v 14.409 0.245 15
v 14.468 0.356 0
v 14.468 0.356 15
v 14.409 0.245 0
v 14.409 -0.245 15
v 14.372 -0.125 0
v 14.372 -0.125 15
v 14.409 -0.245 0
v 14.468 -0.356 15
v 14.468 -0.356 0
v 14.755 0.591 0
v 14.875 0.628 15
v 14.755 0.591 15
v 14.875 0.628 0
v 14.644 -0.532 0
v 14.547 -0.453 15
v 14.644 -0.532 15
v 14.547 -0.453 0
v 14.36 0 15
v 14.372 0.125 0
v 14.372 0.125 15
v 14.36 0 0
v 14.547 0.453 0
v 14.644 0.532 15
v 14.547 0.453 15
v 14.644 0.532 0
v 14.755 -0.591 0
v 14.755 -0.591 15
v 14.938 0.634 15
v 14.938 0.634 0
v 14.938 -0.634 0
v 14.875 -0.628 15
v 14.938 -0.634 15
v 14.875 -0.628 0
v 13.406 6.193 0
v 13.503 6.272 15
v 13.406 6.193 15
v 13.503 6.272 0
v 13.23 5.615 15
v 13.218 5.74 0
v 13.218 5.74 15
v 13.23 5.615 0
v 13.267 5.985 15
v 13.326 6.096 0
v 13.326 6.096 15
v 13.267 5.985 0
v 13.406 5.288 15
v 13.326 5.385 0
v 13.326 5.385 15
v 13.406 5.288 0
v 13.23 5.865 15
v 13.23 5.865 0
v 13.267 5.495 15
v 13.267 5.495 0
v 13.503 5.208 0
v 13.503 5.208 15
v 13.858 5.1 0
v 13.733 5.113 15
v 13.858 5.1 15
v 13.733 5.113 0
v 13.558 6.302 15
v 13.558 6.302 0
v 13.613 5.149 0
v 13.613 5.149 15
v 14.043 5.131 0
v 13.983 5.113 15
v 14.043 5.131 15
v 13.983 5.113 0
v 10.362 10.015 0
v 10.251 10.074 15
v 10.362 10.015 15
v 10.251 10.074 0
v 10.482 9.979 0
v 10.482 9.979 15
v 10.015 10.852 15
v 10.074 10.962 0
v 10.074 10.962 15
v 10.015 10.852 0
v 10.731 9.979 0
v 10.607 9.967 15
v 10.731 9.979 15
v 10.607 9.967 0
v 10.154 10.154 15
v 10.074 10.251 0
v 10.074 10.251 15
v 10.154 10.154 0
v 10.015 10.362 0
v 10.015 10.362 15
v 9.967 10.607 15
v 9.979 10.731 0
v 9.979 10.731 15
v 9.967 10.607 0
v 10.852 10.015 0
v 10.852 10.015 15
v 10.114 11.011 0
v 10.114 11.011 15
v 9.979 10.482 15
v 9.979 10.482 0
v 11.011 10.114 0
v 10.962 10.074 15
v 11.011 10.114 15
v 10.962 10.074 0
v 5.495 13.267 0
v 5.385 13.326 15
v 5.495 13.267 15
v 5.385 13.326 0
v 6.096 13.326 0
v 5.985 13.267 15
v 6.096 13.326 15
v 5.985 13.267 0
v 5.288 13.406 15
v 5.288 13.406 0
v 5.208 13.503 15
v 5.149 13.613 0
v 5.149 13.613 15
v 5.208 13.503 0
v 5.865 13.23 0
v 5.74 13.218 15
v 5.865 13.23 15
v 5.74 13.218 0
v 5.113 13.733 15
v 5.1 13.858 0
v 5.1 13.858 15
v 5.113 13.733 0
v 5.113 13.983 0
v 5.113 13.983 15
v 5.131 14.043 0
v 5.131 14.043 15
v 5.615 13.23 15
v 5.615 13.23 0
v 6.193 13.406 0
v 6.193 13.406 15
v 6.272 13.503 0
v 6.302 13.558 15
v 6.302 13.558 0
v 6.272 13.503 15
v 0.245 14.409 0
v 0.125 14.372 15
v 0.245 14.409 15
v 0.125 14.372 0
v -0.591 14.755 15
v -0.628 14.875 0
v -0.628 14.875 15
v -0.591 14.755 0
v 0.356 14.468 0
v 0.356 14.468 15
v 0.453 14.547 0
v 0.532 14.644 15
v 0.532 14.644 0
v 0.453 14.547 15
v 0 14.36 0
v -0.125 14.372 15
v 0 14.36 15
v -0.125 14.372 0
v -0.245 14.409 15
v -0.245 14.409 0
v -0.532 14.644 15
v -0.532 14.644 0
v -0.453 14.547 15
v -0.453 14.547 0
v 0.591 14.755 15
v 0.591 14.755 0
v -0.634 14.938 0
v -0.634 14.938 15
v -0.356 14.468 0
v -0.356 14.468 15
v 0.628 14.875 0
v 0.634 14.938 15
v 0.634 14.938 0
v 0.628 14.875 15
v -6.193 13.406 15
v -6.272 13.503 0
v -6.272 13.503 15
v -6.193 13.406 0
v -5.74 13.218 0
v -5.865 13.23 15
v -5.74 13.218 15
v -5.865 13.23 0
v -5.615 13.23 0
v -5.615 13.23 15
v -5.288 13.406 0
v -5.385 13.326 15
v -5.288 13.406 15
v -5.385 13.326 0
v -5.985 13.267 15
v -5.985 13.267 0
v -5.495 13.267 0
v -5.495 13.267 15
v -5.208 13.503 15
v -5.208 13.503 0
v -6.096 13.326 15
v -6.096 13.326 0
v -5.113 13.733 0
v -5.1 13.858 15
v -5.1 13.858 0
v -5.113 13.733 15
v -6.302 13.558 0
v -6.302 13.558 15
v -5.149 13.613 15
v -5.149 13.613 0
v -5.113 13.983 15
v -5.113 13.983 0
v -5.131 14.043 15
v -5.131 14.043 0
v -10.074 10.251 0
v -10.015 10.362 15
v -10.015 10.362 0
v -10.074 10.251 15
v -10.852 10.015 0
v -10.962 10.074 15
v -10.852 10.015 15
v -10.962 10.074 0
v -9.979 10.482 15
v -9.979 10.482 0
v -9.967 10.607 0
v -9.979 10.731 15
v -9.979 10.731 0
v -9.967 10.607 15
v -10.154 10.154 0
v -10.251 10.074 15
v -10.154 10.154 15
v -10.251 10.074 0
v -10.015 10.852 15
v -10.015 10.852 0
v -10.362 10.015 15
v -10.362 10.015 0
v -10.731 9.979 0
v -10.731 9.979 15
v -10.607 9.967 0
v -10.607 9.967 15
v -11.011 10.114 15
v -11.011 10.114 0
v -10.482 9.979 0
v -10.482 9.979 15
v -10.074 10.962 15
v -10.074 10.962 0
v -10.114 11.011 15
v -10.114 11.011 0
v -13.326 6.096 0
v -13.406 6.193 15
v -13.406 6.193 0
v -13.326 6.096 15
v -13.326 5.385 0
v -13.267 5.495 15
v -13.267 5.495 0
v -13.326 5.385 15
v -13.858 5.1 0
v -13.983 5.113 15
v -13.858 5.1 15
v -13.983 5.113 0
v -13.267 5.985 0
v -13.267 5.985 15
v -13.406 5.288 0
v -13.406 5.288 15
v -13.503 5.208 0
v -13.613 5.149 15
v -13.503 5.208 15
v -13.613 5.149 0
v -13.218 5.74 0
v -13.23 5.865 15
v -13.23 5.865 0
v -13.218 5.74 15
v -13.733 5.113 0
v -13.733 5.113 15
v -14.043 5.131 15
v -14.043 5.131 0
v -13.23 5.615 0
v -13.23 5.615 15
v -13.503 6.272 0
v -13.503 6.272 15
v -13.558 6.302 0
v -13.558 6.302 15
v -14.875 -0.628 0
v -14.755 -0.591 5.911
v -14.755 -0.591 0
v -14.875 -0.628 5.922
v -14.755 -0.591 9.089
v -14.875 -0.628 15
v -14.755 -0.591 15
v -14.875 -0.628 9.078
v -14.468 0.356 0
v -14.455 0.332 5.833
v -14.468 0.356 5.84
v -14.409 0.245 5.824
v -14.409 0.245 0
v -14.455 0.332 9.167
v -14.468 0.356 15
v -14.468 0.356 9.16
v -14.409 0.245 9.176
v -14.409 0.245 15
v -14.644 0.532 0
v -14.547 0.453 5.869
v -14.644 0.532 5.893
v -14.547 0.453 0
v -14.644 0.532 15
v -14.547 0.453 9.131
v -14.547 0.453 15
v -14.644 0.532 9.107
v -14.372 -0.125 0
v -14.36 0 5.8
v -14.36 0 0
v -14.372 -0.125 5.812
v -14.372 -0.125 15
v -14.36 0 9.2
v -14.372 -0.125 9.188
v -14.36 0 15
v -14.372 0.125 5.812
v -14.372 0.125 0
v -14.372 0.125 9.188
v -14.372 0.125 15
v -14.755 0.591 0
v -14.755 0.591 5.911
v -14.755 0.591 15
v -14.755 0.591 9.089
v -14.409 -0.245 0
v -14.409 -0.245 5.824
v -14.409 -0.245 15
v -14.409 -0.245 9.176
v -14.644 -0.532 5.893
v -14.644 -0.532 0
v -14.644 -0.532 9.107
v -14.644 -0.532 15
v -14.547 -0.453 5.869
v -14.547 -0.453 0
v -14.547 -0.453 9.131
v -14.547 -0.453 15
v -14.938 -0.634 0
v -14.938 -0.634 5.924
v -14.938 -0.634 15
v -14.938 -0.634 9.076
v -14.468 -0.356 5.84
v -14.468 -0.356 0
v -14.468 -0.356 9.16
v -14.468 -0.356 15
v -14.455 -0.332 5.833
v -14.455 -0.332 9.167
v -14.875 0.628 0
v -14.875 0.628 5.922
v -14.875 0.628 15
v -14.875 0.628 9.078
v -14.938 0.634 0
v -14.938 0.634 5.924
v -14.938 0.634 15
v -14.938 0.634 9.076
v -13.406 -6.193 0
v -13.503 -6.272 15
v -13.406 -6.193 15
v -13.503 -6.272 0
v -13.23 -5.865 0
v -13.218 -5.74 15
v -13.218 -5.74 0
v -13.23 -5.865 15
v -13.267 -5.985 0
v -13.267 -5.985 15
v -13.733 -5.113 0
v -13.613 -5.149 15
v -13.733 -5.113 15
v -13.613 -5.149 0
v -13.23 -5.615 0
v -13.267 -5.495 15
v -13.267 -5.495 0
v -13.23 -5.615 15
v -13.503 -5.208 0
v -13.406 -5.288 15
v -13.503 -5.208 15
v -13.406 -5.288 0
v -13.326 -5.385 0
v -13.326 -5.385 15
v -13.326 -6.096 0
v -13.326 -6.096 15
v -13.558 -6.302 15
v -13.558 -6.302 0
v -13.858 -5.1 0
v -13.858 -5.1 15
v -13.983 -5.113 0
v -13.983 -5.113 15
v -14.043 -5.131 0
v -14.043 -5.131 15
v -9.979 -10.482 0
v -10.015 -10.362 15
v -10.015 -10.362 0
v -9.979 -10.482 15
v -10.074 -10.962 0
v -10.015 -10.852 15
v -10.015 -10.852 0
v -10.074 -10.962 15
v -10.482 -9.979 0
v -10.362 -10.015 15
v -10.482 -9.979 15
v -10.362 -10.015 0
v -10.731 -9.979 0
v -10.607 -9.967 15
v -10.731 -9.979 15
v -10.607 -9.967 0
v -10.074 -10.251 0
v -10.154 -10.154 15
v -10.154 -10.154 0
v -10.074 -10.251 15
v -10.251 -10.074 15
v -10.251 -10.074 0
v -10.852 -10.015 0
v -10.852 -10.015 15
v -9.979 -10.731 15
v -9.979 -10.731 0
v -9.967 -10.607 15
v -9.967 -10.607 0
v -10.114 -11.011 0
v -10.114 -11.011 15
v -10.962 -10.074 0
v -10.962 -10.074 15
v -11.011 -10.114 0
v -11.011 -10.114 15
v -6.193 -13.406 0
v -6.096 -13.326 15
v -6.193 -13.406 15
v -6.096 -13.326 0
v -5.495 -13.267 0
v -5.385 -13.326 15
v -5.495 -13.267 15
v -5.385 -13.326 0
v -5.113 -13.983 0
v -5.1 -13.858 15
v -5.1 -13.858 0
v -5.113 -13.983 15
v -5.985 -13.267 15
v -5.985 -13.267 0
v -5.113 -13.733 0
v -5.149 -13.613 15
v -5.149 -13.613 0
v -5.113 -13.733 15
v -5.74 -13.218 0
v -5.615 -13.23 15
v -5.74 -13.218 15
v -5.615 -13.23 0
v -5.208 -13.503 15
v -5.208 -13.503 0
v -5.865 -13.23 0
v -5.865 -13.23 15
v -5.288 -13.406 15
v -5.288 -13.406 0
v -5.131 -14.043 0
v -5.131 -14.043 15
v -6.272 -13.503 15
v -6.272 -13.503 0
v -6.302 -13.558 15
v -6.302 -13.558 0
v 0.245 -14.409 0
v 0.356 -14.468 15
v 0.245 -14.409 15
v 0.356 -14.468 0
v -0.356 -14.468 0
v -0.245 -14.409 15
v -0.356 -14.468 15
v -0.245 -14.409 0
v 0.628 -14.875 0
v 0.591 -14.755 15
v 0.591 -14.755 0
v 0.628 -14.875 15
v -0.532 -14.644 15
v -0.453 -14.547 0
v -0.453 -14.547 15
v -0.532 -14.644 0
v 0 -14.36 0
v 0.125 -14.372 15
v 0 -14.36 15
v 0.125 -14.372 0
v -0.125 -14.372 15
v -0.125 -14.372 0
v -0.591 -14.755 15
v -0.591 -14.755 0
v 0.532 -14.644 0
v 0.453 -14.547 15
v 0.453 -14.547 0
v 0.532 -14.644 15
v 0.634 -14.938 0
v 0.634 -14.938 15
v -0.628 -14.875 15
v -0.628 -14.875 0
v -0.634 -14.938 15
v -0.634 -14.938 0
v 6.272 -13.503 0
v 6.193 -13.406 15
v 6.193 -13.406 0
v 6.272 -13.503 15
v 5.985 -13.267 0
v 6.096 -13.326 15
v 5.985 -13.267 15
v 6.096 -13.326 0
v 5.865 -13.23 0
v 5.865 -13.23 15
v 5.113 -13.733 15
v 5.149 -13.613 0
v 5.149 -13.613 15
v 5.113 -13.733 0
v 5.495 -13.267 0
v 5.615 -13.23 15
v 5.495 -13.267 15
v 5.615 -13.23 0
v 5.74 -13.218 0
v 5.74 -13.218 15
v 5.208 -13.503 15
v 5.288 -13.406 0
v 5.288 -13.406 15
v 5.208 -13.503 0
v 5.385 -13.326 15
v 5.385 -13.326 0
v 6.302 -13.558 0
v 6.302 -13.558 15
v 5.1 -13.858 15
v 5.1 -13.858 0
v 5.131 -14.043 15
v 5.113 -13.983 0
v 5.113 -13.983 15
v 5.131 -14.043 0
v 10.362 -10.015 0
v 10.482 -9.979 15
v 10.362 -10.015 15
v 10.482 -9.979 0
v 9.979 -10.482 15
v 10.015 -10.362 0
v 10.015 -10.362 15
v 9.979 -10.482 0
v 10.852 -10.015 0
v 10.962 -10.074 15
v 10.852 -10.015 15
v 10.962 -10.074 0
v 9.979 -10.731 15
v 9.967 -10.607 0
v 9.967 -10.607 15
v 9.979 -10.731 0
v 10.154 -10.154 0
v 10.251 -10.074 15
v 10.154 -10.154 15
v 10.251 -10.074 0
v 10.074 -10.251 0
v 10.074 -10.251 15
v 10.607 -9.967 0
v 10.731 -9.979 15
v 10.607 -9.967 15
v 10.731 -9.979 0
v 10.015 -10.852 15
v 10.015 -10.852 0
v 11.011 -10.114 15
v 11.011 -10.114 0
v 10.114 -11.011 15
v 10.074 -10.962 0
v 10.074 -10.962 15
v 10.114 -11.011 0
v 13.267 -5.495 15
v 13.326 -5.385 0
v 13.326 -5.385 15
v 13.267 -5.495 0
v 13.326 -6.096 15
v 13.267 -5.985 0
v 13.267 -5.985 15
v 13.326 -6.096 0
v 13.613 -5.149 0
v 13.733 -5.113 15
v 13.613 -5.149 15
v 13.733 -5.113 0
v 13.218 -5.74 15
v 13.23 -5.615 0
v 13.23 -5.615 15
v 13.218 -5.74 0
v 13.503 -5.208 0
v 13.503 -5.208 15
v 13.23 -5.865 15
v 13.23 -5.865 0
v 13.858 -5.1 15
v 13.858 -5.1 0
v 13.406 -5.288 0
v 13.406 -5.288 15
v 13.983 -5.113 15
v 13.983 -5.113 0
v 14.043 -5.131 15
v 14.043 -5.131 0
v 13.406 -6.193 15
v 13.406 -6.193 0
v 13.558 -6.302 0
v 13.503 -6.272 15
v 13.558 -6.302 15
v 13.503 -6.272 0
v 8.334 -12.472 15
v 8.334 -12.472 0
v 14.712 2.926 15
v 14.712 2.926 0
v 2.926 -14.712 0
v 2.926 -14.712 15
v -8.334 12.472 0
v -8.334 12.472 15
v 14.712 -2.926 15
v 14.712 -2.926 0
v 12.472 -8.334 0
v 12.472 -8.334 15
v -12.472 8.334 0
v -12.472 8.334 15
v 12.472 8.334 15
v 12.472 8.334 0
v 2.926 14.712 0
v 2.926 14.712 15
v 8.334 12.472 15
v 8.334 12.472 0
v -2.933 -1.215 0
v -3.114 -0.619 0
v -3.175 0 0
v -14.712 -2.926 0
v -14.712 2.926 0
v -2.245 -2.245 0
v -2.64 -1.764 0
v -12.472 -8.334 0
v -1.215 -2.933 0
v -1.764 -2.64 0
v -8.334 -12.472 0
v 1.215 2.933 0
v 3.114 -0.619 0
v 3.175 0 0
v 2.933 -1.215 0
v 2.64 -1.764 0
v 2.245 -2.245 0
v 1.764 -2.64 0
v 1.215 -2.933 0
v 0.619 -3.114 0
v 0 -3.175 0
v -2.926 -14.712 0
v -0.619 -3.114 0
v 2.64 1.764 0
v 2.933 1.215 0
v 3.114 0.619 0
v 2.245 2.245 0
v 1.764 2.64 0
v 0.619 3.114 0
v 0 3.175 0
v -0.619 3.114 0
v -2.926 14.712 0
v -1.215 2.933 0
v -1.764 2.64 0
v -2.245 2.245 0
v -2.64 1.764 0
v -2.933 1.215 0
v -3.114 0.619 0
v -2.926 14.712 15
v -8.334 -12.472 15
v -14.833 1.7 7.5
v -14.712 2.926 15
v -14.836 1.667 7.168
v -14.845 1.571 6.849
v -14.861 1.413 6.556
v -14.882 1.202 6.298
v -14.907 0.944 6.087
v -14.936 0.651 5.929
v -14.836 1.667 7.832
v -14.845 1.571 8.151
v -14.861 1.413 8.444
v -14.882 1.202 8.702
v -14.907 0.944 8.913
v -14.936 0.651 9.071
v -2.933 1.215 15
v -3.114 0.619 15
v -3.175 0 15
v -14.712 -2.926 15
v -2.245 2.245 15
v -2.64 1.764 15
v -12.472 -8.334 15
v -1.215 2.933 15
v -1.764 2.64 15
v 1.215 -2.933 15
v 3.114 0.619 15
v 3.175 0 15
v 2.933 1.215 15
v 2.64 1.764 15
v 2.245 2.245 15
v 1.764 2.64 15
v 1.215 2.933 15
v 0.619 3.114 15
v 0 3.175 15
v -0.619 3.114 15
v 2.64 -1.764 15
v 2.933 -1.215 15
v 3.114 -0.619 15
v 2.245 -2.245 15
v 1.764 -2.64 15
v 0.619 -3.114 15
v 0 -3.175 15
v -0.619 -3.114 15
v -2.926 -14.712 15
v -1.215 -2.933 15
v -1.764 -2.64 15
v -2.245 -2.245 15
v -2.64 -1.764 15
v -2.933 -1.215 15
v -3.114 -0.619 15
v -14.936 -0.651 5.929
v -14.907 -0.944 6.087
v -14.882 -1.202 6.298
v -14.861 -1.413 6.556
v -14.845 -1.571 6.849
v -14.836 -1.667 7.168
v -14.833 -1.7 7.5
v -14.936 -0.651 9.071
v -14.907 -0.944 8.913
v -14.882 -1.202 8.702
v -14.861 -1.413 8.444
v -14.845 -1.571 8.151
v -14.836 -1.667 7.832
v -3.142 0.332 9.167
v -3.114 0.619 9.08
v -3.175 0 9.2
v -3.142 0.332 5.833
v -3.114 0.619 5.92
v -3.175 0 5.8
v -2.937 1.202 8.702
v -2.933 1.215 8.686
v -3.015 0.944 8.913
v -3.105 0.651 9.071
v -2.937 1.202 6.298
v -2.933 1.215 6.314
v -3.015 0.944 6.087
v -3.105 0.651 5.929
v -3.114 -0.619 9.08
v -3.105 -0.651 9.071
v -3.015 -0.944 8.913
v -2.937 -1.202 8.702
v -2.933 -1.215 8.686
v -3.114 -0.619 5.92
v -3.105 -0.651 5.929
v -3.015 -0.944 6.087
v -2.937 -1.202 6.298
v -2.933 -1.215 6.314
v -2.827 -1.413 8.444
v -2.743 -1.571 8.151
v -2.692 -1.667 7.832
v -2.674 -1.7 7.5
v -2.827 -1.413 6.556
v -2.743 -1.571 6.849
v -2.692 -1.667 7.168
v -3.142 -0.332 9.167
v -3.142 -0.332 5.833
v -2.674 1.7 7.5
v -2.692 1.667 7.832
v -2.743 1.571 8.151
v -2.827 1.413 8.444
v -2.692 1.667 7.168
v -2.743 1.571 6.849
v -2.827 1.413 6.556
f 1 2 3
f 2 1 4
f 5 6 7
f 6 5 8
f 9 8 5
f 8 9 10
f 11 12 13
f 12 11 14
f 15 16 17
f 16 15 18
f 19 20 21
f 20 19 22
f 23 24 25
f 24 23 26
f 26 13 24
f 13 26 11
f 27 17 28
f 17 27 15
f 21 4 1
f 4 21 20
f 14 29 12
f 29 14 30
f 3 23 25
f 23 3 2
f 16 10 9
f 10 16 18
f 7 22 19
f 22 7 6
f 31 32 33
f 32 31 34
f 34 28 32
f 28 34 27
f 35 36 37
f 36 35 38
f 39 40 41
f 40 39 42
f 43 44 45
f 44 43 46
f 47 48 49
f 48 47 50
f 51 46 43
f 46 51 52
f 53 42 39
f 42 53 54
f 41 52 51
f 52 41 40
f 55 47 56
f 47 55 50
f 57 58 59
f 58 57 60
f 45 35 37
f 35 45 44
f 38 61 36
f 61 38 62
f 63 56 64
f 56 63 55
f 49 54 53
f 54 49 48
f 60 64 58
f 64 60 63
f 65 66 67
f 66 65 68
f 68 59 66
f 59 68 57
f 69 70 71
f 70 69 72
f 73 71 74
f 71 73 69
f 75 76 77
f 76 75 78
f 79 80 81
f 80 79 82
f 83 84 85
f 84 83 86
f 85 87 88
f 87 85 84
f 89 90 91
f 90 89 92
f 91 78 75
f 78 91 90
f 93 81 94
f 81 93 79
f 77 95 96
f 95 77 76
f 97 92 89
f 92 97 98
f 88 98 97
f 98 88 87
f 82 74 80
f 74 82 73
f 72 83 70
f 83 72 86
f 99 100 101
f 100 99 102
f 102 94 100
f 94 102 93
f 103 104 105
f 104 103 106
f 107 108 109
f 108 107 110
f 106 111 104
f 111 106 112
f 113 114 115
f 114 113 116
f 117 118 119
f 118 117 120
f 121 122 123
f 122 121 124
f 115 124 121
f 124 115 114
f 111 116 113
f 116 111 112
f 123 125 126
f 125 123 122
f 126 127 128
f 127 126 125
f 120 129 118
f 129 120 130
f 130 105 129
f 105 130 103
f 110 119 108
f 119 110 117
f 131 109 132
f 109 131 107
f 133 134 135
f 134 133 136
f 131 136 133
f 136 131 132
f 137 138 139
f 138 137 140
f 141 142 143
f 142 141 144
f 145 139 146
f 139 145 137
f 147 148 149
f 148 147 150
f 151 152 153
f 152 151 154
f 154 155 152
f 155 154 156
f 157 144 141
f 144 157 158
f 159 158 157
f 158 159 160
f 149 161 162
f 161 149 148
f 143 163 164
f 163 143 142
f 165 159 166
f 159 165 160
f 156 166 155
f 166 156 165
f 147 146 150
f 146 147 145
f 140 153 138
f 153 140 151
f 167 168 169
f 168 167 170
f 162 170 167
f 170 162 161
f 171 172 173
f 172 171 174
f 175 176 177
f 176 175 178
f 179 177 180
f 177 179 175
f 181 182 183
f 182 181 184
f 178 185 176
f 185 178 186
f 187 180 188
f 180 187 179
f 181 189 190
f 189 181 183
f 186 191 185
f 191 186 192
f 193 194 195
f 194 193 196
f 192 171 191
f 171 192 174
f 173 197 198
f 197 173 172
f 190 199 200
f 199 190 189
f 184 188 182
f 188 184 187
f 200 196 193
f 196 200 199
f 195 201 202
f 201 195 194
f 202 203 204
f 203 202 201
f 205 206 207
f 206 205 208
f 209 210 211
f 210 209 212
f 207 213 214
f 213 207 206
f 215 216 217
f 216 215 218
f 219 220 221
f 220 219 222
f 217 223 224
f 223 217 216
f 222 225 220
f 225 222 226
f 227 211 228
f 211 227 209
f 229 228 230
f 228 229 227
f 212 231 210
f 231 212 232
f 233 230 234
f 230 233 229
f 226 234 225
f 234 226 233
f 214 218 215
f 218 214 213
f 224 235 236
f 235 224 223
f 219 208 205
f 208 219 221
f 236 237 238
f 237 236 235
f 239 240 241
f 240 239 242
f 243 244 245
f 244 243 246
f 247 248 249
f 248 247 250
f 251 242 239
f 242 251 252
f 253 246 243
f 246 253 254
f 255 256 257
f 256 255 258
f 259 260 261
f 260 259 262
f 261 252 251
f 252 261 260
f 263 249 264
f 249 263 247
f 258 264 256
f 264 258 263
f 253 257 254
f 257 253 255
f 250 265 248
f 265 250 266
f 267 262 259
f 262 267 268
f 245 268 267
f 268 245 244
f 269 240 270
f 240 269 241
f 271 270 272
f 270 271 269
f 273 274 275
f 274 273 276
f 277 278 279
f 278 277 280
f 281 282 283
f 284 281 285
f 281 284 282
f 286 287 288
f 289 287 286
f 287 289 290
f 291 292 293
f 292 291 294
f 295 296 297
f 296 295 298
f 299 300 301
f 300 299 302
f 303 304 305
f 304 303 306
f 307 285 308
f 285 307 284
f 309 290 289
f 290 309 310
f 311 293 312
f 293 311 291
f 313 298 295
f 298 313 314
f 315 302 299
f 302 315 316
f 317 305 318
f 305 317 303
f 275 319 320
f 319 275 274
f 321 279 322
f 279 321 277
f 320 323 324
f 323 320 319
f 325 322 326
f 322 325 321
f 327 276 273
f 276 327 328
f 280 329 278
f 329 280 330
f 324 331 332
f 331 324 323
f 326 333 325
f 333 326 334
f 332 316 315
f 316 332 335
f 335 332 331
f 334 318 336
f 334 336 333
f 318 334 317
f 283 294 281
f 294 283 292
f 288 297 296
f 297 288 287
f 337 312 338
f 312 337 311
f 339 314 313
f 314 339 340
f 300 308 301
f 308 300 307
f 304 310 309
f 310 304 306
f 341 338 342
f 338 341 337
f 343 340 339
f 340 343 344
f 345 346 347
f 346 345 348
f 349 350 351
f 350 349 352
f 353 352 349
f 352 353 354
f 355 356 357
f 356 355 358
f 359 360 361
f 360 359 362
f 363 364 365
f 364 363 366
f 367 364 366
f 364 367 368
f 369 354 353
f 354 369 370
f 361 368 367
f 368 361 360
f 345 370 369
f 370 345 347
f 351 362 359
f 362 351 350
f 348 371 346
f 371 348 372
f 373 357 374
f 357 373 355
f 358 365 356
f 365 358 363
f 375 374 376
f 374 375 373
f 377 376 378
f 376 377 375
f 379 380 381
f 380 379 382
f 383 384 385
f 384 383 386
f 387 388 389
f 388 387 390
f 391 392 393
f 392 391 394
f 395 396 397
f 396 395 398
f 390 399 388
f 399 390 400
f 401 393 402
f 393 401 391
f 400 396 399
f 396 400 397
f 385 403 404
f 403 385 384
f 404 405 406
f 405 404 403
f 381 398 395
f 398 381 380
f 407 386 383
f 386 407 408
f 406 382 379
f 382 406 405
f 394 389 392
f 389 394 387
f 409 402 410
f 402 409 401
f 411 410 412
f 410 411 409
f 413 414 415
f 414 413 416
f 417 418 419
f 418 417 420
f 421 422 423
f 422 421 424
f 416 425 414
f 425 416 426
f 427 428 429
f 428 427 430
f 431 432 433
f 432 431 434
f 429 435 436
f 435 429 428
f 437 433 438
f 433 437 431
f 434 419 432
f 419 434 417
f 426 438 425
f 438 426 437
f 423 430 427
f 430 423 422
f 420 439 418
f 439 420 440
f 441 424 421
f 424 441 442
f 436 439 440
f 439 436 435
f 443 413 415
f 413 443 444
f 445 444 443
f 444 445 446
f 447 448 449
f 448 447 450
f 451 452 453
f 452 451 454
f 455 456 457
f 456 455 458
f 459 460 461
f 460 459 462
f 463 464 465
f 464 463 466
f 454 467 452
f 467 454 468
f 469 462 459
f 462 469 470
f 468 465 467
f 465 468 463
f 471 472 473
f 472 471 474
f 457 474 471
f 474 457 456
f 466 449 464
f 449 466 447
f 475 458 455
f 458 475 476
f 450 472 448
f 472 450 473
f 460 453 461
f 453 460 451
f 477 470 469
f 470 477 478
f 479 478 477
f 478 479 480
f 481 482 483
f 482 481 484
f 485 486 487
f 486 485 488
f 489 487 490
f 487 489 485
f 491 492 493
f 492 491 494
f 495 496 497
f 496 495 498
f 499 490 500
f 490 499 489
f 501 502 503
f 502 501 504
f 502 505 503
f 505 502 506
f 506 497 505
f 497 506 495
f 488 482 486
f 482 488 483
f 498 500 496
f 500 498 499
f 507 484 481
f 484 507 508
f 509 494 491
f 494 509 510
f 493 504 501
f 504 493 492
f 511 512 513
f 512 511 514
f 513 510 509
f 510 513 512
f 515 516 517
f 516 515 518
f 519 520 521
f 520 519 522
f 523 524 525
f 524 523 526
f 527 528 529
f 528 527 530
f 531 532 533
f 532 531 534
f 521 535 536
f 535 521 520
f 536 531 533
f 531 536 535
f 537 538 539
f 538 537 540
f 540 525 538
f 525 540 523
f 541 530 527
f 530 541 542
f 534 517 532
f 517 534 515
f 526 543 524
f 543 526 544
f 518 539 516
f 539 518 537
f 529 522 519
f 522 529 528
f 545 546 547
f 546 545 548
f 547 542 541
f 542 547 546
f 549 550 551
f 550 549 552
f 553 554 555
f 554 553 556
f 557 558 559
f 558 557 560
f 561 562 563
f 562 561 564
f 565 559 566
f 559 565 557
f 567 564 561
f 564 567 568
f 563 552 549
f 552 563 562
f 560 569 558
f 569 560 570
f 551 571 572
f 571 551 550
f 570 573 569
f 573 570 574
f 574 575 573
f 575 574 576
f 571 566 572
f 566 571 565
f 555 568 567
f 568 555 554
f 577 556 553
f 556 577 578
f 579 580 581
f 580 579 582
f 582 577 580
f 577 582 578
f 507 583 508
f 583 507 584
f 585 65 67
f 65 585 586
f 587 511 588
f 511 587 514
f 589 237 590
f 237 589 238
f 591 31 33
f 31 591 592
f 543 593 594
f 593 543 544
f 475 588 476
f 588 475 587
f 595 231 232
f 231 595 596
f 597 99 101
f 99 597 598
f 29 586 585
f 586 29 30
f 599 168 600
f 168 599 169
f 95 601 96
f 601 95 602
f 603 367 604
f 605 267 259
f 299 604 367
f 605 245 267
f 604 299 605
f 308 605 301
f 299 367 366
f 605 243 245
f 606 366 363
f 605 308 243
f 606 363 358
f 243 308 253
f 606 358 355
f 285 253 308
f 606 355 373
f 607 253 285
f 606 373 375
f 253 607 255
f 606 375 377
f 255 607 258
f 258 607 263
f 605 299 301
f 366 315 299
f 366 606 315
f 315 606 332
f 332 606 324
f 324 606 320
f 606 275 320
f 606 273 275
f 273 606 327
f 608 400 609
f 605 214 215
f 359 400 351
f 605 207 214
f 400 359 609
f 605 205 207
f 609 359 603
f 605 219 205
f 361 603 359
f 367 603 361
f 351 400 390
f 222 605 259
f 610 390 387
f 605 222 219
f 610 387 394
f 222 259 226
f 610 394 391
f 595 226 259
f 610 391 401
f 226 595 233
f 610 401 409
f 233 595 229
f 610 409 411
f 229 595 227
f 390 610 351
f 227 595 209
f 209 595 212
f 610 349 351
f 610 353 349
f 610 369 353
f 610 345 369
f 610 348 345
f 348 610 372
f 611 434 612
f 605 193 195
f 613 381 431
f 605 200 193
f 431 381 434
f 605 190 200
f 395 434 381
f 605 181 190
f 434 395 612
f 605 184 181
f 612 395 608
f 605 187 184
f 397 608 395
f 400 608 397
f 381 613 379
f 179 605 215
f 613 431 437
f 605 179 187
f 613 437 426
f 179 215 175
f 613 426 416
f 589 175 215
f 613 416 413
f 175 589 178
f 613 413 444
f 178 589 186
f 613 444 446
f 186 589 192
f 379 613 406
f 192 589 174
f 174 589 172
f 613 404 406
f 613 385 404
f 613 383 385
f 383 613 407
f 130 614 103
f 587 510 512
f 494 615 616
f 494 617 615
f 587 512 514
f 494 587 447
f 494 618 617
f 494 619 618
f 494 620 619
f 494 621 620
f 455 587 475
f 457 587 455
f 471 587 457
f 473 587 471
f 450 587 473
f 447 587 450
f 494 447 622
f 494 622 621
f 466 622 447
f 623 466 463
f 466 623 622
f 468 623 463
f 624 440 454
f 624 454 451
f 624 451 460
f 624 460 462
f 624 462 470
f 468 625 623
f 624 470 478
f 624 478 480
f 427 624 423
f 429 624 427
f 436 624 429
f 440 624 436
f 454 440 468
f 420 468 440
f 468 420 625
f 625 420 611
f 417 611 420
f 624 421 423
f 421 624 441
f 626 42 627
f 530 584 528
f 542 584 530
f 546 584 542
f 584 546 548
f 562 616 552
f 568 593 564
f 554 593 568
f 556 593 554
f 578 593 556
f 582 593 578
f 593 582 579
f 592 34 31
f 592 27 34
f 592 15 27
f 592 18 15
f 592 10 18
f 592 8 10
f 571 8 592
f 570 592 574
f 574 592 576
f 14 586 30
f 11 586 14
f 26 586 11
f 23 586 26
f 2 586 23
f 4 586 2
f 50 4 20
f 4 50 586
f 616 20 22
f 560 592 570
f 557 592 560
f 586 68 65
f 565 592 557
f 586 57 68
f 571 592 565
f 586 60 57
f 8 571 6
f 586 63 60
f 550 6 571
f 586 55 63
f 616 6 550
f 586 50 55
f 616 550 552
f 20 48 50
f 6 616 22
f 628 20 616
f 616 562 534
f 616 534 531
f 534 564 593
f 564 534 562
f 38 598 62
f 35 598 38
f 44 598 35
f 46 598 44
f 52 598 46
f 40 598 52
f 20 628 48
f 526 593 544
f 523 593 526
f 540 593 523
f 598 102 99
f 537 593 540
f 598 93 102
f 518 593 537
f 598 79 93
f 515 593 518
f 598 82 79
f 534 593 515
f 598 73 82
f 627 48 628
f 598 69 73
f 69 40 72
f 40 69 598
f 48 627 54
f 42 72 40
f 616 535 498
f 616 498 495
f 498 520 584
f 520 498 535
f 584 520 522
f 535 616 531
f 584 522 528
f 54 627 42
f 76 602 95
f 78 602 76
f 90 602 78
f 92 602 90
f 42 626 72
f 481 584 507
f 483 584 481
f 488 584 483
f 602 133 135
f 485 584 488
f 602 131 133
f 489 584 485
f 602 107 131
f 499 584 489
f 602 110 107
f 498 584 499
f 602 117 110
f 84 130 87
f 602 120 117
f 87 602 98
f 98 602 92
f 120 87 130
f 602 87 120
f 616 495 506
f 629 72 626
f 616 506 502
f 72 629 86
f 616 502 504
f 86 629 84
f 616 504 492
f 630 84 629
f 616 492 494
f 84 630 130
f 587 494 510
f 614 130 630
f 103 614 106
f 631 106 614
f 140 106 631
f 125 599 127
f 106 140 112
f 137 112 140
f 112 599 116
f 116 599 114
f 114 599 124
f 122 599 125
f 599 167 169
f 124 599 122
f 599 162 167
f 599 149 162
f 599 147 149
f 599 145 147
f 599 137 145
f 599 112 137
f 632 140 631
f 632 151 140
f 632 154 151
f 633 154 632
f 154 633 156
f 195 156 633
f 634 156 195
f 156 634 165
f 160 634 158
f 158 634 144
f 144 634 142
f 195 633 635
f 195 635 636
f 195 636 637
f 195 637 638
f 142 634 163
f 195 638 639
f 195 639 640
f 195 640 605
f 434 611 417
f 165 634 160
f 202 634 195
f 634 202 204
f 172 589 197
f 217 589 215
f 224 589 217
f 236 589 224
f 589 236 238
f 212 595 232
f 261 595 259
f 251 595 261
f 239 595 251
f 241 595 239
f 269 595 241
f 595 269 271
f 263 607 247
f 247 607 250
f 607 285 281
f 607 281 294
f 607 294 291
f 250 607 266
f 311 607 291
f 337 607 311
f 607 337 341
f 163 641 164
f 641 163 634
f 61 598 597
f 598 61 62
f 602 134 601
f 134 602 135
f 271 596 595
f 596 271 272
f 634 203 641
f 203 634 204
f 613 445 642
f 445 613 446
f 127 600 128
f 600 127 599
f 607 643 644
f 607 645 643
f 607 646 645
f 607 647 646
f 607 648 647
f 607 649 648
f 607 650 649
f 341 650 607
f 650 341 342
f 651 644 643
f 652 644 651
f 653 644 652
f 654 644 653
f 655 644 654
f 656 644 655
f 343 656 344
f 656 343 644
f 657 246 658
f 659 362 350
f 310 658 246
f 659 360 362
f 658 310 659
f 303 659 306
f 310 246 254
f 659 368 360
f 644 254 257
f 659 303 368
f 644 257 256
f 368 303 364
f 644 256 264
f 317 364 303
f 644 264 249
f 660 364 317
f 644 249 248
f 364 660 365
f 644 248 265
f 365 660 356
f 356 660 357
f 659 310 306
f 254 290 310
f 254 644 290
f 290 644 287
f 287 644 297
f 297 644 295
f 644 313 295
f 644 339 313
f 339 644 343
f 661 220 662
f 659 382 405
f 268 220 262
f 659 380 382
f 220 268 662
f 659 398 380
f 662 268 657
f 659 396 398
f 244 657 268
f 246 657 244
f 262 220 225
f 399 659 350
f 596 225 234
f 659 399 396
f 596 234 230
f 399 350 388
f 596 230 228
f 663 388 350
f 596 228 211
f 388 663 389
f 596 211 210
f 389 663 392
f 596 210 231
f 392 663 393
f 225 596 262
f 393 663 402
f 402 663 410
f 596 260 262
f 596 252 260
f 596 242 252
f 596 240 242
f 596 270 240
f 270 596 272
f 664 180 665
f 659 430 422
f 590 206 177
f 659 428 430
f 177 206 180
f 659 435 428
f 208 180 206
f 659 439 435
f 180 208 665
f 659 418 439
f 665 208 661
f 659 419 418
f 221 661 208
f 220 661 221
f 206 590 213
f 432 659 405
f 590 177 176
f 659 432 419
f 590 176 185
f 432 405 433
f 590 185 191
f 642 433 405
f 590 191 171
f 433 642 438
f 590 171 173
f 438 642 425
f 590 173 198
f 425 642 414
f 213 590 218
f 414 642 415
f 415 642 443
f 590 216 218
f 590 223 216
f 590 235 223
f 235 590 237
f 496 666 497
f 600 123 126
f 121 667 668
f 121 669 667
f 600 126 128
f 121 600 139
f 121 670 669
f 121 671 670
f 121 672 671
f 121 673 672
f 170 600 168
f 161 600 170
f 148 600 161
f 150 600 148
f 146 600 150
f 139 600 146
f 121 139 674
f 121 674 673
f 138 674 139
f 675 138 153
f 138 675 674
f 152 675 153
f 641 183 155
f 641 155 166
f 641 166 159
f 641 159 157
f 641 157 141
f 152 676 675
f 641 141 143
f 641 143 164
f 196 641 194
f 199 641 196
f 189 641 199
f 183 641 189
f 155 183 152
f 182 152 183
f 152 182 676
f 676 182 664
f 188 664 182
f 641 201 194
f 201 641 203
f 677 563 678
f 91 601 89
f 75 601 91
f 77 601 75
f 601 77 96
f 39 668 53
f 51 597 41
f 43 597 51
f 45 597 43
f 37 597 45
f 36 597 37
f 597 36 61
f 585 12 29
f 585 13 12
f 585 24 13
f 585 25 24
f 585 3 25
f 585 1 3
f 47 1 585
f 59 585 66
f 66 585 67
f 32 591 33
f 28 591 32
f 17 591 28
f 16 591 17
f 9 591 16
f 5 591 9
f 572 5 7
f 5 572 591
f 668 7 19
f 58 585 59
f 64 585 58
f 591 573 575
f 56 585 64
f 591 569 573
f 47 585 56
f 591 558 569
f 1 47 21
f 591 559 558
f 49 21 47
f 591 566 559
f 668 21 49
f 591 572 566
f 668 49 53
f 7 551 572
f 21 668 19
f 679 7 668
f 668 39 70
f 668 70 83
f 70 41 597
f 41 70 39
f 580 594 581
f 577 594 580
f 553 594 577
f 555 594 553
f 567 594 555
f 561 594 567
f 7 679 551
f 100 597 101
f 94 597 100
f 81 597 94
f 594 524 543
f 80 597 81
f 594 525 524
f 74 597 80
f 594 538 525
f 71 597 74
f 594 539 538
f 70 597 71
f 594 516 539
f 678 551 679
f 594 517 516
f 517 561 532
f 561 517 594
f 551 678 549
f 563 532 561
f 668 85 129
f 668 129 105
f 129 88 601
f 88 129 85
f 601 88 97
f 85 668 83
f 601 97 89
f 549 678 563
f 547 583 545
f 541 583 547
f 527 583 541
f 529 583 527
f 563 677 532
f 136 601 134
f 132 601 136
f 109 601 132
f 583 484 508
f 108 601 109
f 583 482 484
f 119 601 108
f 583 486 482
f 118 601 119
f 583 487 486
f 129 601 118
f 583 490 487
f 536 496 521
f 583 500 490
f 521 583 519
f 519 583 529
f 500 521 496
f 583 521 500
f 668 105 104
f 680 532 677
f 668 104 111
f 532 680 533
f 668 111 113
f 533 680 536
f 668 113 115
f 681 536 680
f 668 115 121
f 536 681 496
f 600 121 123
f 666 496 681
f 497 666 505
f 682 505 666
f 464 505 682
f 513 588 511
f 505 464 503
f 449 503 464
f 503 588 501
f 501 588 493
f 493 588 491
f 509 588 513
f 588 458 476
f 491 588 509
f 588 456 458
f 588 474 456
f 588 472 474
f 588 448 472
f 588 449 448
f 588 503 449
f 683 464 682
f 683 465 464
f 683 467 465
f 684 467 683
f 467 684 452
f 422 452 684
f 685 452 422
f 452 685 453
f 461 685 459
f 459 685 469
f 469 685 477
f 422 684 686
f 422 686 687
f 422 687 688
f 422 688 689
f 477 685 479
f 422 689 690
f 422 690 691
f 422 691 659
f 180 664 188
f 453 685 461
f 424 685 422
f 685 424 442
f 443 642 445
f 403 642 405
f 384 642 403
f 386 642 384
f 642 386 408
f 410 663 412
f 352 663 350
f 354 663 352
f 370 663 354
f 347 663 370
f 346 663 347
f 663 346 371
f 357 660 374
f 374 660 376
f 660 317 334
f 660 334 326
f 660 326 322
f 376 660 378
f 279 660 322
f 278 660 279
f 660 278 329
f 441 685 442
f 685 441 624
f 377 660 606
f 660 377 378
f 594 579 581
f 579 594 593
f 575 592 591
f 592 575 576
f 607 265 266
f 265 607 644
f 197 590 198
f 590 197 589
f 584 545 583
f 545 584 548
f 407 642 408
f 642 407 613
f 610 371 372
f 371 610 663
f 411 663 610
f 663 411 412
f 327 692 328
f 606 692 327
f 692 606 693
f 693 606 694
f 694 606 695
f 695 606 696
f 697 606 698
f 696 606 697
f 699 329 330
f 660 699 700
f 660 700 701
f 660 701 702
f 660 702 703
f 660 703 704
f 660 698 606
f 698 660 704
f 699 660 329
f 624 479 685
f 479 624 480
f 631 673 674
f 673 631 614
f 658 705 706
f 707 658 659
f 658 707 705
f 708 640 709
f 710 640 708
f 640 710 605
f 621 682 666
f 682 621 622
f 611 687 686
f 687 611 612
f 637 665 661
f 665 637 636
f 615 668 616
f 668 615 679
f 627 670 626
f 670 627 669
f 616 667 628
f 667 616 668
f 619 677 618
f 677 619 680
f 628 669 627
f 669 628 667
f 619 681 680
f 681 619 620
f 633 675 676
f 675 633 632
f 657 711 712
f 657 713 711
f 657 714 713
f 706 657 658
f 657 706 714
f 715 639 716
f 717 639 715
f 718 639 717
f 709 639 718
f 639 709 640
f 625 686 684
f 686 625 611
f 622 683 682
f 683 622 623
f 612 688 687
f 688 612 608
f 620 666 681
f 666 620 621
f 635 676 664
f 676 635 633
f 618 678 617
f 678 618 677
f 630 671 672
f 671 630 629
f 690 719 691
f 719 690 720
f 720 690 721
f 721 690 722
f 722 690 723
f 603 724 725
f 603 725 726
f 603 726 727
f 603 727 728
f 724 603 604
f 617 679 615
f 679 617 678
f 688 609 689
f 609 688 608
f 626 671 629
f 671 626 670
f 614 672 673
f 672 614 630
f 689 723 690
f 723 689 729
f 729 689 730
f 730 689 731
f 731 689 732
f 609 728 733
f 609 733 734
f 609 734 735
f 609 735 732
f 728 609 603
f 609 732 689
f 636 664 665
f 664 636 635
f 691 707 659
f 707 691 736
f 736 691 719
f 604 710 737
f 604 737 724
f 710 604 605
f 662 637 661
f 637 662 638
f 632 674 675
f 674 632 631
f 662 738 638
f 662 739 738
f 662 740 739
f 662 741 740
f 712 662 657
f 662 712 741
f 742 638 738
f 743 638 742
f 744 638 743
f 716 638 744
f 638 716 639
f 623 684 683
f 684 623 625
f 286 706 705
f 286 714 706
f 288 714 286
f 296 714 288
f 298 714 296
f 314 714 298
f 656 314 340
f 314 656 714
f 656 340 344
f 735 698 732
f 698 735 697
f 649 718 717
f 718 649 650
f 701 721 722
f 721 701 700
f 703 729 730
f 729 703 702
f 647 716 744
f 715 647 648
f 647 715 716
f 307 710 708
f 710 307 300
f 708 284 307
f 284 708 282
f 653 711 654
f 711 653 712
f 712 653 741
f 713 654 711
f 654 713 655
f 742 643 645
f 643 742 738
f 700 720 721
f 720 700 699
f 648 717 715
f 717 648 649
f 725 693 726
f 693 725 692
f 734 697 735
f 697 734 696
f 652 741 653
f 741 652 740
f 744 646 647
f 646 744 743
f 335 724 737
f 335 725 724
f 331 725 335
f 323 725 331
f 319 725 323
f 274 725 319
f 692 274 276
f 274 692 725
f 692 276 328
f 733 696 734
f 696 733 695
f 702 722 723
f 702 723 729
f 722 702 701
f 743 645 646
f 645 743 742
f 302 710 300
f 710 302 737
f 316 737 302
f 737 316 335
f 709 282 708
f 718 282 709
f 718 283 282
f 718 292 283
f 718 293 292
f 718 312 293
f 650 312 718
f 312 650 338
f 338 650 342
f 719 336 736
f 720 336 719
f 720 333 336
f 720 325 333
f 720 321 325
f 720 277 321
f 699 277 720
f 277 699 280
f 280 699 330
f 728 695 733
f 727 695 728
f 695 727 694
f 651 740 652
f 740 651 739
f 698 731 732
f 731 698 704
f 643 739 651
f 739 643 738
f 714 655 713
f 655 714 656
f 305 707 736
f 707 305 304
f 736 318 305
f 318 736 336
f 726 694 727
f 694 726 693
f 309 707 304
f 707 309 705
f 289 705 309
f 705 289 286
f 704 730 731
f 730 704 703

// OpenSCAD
$fn = 32;

// ----------------------------------------------------------------------
// Hand knob: 30 x 30 x 15 mm
// ----------------------------------------------------------------------

// --- parameters (mm) ---
grip_d = 30;              // knob diameter
grip_h = 15;              // knob height
shaft_d = 6.35;           // shaft bore
set_d = 3.4;              // set screw tap hole
knurl_dia = 1.28;         // knurl groove diameter
knurl_n = 16;             // number of knurl grooves

module body() {
  cylinder(h = grip_h, d = grip_d);
}

difference() {
  union() {
    body();
  }
  translate([0, 0, -1]) cylinder(h = grip_h + 0 + 2, d = shaft_d);
  /* knurl grooves */
  for (i = [0 : knurl_n - 1])
    rotate([0, 0, i * 360 / knurl_n])
      translate([grip_d / 2, 0, -0.5])
        cylinder(h = grip_h + 1, d = knurl_dia);
  translate([-grip_d / 2 - 1, 0, grip_h * 0.5]) rotate([0, 90, 0]) cylinder(h = grip_d / 2 + 2, d = set_d);
}
